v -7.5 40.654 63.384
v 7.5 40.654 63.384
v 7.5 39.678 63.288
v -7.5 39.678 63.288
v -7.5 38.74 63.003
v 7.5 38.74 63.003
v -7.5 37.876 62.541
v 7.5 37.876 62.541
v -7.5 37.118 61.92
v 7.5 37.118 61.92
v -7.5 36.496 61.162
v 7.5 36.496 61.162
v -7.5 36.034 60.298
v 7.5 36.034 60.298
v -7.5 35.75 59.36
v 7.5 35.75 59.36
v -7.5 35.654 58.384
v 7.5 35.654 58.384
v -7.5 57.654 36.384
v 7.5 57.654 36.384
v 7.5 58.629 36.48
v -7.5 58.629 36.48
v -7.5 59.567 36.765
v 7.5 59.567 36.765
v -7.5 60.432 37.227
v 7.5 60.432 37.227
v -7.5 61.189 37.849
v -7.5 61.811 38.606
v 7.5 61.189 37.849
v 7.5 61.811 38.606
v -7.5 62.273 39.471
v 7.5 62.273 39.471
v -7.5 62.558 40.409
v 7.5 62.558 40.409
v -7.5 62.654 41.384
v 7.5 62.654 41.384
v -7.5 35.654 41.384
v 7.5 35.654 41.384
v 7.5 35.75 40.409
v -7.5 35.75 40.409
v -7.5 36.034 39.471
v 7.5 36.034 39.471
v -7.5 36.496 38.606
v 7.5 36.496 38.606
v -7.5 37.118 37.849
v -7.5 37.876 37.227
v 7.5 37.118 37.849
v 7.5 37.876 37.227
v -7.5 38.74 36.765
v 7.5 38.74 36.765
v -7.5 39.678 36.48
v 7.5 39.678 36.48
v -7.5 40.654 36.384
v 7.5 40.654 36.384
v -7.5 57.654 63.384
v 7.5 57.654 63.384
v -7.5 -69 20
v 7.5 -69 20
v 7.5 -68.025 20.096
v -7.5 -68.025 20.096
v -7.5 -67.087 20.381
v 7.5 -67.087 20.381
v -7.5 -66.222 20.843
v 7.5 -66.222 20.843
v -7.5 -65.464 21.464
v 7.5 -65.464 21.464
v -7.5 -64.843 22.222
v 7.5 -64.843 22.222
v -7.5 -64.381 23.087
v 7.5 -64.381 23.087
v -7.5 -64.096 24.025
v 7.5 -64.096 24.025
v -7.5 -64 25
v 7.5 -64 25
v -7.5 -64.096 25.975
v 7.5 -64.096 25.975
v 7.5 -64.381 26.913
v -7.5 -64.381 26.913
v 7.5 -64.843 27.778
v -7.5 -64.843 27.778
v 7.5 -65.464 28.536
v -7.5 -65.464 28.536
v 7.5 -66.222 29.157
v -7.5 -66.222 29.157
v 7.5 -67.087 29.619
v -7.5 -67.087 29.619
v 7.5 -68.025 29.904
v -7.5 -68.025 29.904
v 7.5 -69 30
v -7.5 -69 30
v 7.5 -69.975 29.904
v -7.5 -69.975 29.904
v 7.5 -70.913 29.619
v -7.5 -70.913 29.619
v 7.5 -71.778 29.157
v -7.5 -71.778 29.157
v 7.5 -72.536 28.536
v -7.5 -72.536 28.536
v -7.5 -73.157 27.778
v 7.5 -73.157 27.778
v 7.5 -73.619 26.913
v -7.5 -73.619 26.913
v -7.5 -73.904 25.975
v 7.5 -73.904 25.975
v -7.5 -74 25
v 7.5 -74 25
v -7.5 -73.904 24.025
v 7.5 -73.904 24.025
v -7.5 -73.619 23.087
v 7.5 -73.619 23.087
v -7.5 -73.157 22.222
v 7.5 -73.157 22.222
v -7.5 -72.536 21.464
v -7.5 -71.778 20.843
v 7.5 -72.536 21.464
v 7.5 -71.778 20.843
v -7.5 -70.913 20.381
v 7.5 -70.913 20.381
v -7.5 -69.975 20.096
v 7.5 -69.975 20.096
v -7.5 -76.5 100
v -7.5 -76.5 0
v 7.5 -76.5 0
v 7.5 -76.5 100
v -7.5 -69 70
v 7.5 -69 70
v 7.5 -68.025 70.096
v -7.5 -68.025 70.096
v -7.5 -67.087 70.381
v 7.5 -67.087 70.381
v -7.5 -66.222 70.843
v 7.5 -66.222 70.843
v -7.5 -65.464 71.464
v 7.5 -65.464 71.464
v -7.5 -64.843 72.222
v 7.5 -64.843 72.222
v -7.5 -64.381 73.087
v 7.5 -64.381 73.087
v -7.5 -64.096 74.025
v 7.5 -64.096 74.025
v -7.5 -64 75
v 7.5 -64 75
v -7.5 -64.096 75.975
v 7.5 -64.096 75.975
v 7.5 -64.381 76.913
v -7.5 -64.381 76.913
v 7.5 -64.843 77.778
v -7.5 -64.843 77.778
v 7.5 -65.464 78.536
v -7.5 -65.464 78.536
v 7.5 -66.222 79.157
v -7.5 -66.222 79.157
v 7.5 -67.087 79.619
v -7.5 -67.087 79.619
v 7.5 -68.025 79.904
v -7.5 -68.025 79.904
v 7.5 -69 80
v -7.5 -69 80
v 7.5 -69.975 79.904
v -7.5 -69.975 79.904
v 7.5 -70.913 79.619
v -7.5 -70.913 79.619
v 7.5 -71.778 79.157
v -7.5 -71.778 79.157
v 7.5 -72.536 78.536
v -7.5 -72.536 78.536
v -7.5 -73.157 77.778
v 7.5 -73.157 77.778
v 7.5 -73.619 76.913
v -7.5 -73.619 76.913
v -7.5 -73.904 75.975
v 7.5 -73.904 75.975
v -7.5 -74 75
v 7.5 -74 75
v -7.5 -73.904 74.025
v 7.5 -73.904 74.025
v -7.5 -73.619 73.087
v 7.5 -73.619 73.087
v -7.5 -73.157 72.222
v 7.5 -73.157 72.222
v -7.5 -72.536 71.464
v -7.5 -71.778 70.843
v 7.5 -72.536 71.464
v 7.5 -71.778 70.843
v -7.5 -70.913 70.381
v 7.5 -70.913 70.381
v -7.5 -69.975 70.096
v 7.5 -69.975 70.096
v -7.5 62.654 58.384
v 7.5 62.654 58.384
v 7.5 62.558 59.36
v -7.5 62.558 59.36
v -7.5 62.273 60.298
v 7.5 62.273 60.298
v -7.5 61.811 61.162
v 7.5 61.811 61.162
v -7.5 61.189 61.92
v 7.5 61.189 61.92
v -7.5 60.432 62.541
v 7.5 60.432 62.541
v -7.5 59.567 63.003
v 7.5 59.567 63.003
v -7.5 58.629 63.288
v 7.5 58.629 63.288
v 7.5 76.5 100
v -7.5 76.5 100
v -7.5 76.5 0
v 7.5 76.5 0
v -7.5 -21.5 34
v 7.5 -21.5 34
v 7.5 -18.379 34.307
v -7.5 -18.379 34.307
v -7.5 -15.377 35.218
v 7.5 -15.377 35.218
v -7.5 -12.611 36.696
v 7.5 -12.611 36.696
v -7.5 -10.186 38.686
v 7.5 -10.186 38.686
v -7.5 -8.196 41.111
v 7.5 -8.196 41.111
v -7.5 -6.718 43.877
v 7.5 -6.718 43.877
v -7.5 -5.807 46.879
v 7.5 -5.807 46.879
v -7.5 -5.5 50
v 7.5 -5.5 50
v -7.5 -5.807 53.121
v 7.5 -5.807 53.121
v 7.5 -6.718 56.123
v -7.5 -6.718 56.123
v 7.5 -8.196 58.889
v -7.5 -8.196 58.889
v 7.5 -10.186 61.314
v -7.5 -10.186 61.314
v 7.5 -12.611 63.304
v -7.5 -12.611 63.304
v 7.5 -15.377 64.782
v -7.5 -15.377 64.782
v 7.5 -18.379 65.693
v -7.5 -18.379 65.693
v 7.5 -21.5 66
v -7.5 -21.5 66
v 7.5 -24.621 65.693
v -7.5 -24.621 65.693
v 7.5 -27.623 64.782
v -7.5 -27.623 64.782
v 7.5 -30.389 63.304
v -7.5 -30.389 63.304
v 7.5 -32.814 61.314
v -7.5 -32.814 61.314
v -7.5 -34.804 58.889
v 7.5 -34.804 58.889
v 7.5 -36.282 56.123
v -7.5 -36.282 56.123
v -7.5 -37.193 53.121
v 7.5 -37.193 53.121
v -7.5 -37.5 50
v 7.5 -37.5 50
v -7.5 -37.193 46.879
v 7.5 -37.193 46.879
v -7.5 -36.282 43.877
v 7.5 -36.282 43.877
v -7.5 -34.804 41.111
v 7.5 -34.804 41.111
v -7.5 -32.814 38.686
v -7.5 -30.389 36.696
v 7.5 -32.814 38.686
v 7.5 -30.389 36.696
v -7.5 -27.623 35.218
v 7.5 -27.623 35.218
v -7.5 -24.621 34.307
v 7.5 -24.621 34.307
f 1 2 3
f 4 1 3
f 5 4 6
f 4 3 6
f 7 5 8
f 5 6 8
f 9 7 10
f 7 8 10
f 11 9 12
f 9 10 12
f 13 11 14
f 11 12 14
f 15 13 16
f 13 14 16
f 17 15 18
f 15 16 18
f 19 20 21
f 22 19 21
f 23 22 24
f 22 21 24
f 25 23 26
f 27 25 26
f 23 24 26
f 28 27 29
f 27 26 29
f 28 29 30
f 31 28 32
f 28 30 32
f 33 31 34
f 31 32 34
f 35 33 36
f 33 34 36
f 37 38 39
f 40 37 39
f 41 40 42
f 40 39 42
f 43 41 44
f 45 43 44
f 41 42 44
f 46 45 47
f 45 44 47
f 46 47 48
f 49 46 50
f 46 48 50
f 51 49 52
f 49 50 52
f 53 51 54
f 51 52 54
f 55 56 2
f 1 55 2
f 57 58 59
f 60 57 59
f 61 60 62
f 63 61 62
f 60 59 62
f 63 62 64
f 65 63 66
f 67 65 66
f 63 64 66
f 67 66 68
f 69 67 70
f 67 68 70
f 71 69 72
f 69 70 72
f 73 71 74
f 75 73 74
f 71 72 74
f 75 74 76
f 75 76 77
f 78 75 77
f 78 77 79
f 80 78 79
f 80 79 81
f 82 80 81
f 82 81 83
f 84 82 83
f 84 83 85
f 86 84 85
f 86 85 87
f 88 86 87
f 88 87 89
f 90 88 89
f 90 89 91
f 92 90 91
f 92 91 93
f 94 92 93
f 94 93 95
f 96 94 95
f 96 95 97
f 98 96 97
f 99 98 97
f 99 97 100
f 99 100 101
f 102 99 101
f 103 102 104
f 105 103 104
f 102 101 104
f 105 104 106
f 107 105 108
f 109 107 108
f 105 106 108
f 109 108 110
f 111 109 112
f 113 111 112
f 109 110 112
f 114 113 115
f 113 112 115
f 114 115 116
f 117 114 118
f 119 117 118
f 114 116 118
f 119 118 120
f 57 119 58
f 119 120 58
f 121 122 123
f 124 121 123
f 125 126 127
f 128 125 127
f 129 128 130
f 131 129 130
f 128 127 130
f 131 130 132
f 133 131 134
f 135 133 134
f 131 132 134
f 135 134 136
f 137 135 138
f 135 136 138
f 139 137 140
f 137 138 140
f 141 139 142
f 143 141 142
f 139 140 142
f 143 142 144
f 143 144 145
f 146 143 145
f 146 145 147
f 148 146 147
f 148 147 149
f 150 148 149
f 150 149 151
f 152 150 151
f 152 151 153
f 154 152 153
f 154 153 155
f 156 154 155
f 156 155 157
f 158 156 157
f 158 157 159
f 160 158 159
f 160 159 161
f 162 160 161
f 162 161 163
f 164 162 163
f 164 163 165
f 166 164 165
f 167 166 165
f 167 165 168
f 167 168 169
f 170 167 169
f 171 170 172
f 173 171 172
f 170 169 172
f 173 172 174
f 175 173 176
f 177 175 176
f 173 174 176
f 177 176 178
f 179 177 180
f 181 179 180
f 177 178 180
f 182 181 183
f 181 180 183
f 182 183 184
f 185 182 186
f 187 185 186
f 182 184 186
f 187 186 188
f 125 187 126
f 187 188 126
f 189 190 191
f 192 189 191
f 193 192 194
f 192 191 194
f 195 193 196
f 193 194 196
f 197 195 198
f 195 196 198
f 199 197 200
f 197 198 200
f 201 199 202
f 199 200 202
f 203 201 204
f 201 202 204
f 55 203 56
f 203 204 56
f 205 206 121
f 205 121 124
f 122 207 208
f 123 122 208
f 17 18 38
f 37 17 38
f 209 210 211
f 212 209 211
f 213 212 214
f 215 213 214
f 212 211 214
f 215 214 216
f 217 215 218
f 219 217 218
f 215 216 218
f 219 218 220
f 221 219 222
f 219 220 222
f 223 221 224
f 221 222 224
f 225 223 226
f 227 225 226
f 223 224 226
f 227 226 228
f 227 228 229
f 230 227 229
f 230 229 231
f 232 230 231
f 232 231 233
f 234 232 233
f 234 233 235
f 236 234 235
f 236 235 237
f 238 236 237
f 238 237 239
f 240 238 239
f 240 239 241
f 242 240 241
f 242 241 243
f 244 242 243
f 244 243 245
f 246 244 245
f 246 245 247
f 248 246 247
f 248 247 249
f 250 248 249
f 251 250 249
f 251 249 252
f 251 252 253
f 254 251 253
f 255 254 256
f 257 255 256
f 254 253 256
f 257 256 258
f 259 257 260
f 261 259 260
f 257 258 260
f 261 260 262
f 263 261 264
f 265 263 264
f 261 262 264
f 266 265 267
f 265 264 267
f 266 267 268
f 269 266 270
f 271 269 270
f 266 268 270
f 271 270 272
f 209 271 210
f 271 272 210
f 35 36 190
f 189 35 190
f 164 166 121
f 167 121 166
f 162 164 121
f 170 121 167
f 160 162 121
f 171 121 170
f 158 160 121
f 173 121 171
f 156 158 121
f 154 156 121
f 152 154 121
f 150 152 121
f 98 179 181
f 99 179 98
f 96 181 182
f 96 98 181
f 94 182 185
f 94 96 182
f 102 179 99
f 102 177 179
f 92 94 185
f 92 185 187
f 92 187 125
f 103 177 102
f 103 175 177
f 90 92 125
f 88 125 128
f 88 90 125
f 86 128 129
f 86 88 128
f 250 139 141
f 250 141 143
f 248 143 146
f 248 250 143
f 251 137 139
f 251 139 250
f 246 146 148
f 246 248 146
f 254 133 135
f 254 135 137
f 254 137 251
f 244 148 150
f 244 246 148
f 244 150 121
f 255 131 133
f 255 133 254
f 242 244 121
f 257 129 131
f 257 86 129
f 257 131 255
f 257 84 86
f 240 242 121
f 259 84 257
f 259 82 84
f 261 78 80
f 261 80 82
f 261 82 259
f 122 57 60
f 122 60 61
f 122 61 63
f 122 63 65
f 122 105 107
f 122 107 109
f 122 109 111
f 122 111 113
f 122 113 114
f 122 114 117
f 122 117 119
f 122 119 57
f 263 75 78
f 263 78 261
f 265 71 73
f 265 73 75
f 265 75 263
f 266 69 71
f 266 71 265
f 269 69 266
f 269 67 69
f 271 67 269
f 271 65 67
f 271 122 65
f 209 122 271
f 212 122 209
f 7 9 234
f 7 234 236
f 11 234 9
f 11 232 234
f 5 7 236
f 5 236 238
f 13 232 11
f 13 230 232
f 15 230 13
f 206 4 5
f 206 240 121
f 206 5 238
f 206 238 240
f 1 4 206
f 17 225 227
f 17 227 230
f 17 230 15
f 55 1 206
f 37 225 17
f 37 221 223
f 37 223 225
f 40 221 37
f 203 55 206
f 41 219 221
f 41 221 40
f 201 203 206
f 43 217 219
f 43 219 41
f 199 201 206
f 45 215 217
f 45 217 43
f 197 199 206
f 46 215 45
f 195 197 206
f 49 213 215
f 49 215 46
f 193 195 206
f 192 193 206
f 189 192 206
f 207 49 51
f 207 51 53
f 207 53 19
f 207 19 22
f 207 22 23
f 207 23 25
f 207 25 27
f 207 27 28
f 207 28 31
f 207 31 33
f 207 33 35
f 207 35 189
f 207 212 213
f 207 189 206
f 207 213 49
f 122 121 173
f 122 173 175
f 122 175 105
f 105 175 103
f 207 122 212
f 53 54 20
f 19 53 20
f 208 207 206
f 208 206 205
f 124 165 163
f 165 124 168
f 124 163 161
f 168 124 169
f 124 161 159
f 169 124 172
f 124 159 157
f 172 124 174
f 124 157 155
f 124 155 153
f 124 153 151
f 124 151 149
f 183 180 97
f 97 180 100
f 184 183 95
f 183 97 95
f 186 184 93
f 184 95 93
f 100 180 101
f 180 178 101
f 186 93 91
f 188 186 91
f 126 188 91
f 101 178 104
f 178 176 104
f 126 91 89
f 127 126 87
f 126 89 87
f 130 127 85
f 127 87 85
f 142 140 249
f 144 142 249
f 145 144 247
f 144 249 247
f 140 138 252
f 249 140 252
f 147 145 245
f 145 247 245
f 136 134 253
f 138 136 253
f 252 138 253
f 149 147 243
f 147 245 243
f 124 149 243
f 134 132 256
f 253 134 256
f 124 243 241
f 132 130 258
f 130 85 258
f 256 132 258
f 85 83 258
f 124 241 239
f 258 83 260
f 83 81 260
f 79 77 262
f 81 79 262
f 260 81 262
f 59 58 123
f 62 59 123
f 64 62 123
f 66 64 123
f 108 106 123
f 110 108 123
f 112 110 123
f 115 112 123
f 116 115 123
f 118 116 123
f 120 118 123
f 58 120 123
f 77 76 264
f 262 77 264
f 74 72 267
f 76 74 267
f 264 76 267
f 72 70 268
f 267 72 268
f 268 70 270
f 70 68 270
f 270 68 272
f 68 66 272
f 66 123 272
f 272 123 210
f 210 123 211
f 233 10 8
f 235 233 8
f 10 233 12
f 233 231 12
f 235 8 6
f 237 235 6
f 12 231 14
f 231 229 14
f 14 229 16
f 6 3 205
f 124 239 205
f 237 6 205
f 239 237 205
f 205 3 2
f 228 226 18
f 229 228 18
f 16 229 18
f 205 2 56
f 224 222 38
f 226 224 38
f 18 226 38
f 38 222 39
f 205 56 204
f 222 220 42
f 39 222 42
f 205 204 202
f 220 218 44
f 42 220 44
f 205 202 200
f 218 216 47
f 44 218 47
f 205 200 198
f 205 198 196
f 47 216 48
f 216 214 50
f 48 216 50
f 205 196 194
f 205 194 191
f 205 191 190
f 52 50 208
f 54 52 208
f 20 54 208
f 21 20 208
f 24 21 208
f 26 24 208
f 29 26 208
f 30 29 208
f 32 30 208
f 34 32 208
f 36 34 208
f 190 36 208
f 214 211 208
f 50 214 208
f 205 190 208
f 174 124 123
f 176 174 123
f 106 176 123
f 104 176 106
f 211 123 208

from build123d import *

# Parameters (mm, degrees)
IZIM1_W                     = 15
IZIM1_H                     = 153
Y_KSEKLIK_EKSTR_ZYON1_DEPTH = 100
IZIM2_R                     = 5
KES_EKSTR_ZYON2_DEPTH       = 16
IZIM3_R                     = 16
KES_EKSTR_ZYON3_DEPTH       = 16


with BuildPart() as part:
    # Çizim1 → Yükseklik-Ekstrüzyon1 (new body)
    with BuildSketch(Plane.XY):
        Rectangle(IZIM1_W, IZIM1_H)
    extrude(amount=Y_KSEKLIK_EKSTR_ZYON1_DEPTH)

    # Çizim2 → Kes-Ekstrüzyon2 (cut, through all)
    with BuildSketch(Plane(origin=(7.5, 0, 0), x_dir=(0, 0, -1), z_dir=(1, 0, 0))):
        with Locations((-75, -69)):
            Circle(IZIM2_R)
        with Locations((-25, -69)):
            Circle(IZIM2_R)
    extrude(amount=-KES_EKSTR_ZYON2_DEPTH, mode=Mode.SUBTRACT)

    # Çizim3 → Kes-Ekstrüzyon3 (cut, through all)
    with BuildSketch(Plane(origin=(7.5, 0, 0), x_dir=(0, 0, -1), z_dir=(1, 0, 0))):
        with Locations((-50, -21.5)):
            Circle(IZIM3_R)
        with BuildLine():
            Line((-58.38409441, 35.653702621), (-41.38409441, 35.653702621))
            ThreePointArc((-41.38409441, 35.653702621), (-37.848560504, 37.118168715), (-36.38409441, 40.653702621))
            Line((-36.38409441, 40.653702621), (-36.38409441, 57.653702621))
            ThreePointArc((-36.38409441, 57.653702621), (-37.848560504, 61.189236527), (-41.38409441, 62.653702621))
            Line((-41.38409441, 62.653702621), (-58.38409441, 62.653702621))
            ThreePointArc((-58.38409441, 62.653702621), (-61.919628316, 61.189236527), (-63.38409441, 57.653702621))
            Line((-63.38409441, 57.653702621), (-63.38409441, 40.653702621))
            ThreePointArc((-63.38409441, 40.653702621), (-61.919628316, 37.118168715), (-58.38409441, 35.653702621))
        make_face()
    extrude(amount=-KES_EKSTR_ZYON3_DEPTH, mode=Mode.SUBTRACT)


solid = part.part
